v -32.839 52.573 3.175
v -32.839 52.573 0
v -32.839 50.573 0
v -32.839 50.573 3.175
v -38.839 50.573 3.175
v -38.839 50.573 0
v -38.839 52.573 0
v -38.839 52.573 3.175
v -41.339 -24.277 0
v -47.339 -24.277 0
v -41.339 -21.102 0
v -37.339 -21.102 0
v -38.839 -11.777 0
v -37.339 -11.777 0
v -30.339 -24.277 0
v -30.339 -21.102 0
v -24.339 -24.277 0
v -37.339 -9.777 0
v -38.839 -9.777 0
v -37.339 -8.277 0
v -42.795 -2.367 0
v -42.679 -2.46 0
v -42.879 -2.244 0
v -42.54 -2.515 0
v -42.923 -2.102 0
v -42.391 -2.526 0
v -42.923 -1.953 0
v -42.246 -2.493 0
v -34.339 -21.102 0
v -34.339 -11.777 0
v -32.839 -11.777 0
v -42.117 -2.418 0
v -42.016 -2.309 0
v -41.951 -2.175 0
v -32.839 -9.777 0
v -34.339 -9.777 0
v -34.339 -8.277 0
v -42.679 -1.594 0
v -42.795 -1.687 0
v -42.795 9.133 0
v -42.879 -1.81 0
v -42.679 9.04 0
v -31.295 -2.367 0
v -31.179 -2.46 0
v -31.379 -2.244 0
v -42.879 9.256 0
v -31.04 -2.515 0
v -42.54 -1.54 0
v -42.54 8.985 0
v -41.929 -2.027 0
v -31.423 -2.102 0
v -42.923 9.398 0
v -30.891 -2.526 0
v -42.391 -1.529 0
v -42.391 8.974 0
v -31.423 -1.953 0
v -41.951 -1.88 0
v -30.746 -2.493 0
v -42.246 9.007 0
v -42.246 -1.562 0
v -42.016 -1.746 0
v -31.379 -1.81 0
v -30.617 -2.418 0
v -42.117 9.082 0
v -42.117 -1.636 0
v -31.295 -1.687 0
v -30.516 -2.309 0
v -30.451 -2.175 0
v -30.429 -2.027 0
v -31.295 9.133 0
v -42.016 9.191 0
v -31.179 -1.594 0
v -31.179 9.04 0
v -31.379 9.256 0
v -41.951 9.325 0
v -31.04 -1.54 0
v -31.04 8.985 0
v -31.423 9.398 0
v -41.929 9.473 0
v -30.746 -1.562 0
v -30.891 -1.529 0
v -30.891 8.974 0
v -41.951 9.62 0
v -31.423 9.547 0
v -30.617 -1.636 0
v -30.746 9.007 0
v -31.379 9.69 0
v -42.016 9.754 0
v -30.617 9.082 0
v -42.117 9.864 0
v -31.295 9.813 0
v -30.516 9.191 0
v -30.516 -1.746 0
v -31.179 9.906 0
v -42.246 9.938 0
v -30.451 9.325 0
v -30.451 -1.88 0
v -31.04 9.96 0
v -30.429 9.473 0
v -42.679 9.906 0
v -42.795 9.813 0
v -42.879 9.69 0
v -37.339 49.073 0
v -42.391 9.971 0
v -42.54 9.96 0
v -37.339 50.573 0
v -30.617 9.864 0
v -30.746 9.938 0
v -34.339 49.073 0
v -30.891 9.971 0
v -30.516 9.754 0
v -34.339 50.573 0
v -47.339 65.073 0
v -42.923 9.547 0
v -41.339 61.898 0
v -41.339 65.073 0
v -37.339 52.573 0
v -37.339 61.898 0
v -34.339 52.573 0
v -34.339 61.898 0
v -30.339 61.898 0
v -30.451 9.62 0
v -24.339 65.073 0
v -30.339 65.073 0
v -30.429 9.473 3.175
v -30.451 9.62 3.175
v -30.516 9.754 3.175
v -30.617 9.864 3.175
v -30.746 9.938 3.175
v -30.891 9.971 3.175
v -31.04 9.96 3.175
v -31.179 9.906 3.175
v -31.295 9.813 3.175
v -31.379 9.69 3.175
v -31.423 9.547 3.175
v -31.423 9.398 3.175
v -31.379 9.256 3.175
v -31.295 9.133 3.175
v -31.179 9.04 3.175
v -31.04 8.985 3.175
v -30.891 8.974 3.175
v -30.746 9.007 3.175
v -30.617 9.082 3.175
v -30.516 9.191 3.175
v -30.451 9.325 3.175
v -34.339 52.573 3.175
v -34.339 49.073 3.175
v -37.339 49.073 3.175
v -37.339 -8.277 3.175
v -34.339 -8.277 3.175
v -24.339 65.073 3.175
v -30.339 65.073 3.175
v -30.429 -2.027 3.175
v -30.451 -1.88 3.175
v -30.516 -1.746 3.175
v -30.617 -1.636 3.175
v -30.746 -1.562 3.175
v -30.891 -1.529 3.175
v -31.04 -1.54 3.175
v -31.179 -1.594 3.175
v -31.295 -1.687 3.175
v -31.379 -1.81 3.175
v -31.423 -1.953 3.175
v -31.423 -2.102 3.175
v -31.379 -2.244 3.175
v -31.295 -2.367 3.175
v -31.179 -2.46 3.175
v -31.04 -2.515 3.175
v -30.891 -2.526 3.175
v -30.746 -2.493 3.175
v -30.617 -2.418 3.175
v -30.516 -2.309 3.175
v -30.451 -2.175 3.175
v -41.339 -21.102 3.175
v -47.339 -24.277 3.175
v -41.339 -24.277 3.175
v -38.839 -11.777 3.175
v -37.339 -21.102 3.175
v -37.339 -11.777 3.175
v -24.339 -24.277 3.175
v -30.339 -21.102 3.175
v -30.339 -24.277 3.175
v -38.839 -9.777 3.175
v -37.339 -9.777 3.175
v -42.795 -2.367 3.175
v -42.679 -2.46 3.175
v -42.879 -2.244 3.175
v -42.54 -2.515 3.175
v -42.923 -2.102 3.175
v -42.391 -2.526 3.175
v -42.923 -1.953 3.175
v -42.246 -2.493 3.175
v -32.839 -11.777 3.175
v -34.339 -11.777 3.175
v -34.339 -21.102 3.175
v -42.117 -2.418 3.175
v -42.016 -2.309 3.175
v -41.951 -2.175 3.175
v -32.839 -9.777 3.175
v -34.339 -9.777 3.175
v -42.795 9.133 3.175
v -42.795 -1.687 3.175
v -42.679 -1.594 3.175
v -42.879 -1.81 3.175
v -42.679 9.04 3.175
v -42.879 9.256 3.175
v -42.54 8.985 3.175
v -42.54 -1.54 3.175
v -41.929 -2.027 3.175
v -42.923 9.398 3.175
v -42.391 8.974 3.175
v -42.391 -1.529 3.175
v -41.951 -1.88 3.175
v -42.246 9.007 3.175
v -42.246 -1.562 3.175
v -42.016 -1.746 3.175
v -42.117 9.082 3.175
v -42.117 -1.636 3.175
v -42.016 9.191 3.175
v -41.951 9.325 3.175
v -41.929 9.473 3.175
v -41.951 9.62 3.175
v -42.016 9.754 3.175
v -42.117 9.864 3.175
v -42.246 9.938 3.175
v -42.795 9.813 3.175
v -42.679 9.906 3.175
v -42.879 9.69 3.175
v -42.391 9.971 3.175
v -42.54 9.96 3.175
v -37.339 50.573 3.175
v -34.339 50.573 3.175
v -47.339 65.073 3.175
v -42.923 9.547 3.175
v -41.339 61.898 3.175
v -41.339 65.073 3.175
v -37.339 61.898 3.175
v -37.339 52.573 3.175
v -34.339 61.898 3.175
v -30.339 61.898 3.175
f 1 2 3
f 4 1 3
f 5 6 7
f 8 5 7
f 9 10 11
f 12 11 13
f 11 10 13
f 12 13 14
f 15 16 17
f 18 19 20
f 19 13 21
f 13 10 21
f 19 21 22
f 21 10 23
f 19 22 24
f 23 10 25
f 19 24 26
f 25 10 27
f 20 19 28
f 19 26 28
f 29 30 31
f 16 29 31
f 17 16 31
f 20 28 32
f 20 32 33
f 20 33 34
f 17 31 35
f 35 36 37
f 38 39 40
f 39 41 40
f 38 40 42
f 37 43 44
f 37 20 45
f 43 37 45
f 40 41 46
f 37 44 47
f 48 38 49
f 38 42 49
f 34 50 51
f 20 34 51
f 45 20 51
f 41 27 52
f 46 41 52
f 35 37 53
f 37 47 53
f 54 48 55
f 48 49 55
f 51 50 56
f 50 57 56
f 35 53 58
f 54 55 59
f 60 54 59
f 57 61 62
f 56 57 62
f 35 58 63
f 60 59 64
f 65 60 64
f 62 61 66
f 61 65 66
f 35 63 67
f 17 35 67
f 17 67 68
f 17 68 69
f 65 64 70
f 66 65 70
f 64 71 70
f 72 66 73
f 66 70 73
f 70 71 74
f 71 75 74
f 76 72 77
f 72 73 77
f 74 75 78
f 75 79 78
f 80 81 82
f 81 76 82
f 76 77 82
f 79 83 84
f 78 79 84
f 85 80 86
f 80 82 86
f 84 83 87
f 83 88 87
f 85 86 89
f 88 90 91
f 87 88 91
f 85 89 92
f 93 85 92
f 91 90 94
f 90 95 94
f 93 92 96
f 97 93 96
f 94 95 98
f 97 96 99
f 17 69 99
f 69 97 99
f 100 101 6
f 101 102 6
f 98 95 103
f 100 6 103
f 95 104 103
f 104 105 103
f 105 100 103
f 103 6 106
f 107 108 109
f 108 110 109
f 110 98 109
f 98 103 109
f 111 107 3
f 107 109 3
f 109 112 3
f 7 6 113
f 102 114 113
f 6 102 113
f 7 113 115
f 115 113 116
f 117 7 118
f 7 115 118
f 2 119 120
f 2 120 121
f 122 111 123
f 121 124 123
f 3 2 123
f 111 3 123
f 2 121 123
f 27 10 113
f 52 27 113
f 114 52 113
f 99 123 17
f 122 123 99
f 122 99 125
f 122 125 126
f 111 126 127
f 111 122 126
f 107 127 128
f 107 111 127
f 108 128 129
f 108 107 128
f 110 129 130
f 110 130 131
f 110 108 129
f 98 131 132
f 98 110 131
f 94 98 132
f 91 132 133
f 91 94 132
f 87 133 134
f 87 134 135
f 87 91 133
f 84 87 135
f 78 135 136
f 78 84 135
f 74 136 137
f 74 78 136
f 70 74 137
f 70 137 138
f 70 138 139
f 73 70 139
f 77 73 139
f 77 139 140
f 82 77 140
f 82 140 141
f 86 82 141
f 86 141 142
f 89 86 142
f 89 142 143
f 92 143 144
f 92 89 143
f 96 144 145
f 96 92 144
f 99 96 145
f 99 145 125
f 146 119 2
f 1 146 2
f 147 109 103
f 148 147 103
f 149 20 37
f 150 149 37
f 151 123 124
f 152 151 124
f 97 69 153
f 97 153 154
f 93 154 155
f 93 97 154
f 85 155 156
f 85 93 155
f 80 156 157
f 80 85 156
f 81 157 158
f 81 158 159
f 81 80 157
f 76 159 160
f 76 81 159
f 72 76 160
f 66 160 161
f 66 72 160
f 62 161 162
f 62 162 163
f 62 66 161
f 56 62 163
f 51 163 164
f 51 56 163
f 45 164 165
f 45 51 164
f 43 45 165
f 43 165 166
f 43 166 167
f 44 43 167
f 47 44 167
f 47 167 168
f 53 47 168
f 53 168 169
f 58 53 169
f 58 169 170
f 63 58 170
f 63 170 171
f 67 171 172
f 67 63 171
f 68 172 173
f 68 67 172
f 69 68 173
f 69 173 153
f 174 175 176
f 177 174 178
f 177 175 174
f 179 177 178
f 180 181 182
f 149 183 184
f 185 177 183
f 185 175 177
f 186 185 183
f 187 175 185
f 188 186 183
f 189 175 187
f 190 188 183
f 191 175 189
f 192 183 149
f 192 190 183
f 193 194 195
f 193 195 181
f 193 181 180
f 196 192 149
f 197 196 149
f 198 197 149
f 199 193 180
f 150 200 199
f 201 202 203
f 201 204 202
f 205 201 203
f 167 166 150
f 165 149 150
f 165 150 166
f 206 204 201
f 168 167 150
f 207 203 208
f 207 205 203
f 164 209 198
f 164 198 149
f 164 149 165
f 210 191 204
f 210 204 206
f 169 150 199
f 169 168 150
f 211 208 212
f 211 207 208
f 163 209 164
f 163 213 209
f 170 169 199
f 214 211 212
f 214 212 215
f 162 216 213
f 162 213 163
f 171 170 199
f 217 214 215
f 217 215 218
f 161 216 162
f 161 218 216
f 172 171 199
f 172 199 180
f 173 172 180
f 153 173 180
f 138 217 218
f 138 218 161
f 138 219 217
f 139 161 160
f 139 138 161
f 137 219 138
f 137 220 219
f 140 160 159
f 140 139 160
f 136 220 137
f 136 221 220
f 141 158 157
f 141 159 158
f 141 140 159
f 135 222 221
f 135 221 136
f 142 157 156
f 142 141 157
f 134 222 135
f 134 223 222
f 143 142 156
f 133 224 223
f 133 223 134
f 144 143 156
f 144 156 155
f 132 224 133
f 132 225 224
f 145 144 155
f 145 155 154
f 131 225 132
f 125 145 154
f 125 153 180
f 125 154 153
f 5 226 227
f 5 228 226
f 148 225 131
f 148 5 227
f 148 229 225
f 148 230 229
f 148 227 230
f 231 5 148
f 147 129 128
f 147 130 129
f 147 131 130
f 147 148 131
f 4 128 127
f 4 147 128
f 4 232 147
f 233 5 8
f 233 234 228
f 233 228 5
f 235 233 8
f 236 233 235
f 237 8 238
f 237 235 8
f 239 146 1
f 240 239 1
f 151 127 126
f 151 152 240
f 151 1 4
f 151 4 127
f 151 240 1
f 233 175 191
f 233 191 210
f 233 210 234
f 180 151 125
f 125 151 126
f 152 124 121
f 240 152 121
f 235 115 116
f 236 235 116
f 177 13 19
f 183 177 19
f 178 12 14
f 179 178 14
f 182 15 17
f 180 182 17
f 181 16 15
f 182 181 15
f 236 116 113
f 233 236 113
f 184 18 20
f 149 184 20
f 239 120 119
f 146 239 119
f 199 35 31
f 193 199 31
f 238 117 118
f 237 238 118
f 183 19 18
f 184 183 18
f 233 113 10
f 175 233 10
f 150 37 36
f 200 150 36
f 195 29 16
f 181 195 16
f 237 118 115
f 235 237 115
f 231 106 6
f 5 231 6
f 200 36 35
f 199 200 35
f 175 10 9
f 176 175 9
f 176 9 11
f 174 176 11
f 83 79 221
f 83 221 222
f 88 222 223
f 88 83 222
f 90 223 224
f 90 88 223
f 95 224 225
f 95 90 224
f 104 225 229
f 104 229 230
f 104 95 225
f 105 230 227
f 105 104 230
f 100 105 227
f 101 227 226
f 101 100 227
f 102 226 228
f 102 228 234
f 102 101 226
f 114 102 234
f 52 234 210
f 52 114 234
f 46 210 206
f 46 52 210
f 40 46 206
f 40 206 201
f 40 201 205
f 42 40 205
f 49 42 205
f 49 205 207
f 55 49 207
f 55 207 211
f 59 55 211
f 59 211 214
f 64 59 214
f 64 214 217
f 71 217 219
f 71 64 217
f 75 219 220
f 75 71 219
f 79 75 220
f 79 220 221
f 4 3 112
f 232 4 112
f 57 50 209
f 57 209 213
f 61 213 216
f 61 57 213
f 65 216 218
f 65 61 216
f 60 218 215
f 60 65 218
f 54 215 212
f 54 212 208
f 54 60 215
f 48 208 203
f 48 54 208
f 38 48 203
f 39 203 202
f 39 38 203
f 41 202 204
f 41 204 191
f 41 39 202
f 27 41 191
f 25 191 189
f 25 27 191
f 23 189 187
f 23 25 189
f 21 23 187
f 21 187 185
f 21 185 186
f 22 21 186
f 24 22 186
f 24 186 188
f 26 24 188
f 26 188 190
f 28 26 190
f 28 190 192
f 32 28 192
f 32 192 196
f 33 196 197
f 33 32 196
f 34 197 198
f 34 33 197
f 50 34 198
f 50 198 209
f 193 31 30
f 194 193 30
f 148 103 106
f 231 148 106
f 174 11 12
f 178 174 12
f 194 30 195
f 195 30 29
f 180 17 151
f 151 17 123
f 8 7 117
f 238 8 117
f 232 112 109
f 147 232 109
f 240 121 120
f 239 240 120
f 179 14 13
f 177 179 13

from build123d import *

# Parameters (mm, degrees)
F0_R     = 0.5
F1_DEPTH = 3.175


# Not quite as in the source:
# - a length typed as a fraction of an inch, garbled in the dataset ("3 / 203.2 mm" for 3/8 in), is restored


with BuildPart() as f1:
    # F0 (on Top) → F1 (new body)
    with BuildSketch(Plane.XY):
        Polygon((-34.3393906951, 49.0726131633), (-37.3393906951, 49.0726131633), (-37.3393906951, 50.5726131633), (-38.8393906951, 50.5726131633), (-38.8393906951, 52.5726131633), (-37.3393906951, 52.5726131633), (-37.3393906951, 61.8976131633), (-41.3393906951, 61.8976131633), (-41.3393906951, 65.0726131633), (-47.3393906951, 65.0726131633), (-47.3393906951, 61.8976131633), (-47.3393906951, -21.1023868367), (-47.3393906951, -24.2773868367), (-41.3393906951, -24.2773868367), (-41.3393906951, -21.1023868367), (-37.3393906951, -21.1023868367), (-37.3393906951, -11.7773868367), (-38.8393906951, -11.7773868367), (-38.8393906951, -9.7773868367), (-37.3393906951, -9.7773868367), (-37.3393906951, -8.2773868367), (-34.3393906951, -8.2773868367), (-34.3393906951, -9.7773868367), (-32.8393906951, -9.7773868367), (-32.8393906951, -11.7773868367), (-34.3393906951, -11.7773868367), (-34.3393906951, -21.1023868367), (-30.3393906951, -21.1023868367), (-30.3393906951, -24.2773868367), (-24.3393906951, -24.2773868367), (-24.3393906951, -21.1023868367), (-24.3393906951, 61.8976131633), (-24.3393906951, 65.0726131633), (-30.3393906951, 65.0726131633), (-30.3393906951, 61.8976131633), (-34.3393906951, 61.8976131633), (-34.3393906951, 52.5726131633), (-32.8393906951, 52.5726131633), (-32.8393906951, 50.5726131633), (-34.3393906951, 50.5726131633), align=None)
        with Locations((-42.4286872149, -2.0273868367)):
            Circle(F0_R, mode=Mode.SUBTRACT)
        with Locations((-42.4286872149, 9.4726131633)):
            Circle(F0_R, mode=Mode.SUBTRACT)
        with Locations((-30.9286872149, -2.0273868367)):
            Circle(F0_R, mode=Mode.SUBTRACT)
        with Locations((-30.9286872149, 9.4726131633)):
            Circle(F0_R, mode=Mode.SUBTRACT)
    extrude(amount=F1_DEPTH)


solid = f1.part
